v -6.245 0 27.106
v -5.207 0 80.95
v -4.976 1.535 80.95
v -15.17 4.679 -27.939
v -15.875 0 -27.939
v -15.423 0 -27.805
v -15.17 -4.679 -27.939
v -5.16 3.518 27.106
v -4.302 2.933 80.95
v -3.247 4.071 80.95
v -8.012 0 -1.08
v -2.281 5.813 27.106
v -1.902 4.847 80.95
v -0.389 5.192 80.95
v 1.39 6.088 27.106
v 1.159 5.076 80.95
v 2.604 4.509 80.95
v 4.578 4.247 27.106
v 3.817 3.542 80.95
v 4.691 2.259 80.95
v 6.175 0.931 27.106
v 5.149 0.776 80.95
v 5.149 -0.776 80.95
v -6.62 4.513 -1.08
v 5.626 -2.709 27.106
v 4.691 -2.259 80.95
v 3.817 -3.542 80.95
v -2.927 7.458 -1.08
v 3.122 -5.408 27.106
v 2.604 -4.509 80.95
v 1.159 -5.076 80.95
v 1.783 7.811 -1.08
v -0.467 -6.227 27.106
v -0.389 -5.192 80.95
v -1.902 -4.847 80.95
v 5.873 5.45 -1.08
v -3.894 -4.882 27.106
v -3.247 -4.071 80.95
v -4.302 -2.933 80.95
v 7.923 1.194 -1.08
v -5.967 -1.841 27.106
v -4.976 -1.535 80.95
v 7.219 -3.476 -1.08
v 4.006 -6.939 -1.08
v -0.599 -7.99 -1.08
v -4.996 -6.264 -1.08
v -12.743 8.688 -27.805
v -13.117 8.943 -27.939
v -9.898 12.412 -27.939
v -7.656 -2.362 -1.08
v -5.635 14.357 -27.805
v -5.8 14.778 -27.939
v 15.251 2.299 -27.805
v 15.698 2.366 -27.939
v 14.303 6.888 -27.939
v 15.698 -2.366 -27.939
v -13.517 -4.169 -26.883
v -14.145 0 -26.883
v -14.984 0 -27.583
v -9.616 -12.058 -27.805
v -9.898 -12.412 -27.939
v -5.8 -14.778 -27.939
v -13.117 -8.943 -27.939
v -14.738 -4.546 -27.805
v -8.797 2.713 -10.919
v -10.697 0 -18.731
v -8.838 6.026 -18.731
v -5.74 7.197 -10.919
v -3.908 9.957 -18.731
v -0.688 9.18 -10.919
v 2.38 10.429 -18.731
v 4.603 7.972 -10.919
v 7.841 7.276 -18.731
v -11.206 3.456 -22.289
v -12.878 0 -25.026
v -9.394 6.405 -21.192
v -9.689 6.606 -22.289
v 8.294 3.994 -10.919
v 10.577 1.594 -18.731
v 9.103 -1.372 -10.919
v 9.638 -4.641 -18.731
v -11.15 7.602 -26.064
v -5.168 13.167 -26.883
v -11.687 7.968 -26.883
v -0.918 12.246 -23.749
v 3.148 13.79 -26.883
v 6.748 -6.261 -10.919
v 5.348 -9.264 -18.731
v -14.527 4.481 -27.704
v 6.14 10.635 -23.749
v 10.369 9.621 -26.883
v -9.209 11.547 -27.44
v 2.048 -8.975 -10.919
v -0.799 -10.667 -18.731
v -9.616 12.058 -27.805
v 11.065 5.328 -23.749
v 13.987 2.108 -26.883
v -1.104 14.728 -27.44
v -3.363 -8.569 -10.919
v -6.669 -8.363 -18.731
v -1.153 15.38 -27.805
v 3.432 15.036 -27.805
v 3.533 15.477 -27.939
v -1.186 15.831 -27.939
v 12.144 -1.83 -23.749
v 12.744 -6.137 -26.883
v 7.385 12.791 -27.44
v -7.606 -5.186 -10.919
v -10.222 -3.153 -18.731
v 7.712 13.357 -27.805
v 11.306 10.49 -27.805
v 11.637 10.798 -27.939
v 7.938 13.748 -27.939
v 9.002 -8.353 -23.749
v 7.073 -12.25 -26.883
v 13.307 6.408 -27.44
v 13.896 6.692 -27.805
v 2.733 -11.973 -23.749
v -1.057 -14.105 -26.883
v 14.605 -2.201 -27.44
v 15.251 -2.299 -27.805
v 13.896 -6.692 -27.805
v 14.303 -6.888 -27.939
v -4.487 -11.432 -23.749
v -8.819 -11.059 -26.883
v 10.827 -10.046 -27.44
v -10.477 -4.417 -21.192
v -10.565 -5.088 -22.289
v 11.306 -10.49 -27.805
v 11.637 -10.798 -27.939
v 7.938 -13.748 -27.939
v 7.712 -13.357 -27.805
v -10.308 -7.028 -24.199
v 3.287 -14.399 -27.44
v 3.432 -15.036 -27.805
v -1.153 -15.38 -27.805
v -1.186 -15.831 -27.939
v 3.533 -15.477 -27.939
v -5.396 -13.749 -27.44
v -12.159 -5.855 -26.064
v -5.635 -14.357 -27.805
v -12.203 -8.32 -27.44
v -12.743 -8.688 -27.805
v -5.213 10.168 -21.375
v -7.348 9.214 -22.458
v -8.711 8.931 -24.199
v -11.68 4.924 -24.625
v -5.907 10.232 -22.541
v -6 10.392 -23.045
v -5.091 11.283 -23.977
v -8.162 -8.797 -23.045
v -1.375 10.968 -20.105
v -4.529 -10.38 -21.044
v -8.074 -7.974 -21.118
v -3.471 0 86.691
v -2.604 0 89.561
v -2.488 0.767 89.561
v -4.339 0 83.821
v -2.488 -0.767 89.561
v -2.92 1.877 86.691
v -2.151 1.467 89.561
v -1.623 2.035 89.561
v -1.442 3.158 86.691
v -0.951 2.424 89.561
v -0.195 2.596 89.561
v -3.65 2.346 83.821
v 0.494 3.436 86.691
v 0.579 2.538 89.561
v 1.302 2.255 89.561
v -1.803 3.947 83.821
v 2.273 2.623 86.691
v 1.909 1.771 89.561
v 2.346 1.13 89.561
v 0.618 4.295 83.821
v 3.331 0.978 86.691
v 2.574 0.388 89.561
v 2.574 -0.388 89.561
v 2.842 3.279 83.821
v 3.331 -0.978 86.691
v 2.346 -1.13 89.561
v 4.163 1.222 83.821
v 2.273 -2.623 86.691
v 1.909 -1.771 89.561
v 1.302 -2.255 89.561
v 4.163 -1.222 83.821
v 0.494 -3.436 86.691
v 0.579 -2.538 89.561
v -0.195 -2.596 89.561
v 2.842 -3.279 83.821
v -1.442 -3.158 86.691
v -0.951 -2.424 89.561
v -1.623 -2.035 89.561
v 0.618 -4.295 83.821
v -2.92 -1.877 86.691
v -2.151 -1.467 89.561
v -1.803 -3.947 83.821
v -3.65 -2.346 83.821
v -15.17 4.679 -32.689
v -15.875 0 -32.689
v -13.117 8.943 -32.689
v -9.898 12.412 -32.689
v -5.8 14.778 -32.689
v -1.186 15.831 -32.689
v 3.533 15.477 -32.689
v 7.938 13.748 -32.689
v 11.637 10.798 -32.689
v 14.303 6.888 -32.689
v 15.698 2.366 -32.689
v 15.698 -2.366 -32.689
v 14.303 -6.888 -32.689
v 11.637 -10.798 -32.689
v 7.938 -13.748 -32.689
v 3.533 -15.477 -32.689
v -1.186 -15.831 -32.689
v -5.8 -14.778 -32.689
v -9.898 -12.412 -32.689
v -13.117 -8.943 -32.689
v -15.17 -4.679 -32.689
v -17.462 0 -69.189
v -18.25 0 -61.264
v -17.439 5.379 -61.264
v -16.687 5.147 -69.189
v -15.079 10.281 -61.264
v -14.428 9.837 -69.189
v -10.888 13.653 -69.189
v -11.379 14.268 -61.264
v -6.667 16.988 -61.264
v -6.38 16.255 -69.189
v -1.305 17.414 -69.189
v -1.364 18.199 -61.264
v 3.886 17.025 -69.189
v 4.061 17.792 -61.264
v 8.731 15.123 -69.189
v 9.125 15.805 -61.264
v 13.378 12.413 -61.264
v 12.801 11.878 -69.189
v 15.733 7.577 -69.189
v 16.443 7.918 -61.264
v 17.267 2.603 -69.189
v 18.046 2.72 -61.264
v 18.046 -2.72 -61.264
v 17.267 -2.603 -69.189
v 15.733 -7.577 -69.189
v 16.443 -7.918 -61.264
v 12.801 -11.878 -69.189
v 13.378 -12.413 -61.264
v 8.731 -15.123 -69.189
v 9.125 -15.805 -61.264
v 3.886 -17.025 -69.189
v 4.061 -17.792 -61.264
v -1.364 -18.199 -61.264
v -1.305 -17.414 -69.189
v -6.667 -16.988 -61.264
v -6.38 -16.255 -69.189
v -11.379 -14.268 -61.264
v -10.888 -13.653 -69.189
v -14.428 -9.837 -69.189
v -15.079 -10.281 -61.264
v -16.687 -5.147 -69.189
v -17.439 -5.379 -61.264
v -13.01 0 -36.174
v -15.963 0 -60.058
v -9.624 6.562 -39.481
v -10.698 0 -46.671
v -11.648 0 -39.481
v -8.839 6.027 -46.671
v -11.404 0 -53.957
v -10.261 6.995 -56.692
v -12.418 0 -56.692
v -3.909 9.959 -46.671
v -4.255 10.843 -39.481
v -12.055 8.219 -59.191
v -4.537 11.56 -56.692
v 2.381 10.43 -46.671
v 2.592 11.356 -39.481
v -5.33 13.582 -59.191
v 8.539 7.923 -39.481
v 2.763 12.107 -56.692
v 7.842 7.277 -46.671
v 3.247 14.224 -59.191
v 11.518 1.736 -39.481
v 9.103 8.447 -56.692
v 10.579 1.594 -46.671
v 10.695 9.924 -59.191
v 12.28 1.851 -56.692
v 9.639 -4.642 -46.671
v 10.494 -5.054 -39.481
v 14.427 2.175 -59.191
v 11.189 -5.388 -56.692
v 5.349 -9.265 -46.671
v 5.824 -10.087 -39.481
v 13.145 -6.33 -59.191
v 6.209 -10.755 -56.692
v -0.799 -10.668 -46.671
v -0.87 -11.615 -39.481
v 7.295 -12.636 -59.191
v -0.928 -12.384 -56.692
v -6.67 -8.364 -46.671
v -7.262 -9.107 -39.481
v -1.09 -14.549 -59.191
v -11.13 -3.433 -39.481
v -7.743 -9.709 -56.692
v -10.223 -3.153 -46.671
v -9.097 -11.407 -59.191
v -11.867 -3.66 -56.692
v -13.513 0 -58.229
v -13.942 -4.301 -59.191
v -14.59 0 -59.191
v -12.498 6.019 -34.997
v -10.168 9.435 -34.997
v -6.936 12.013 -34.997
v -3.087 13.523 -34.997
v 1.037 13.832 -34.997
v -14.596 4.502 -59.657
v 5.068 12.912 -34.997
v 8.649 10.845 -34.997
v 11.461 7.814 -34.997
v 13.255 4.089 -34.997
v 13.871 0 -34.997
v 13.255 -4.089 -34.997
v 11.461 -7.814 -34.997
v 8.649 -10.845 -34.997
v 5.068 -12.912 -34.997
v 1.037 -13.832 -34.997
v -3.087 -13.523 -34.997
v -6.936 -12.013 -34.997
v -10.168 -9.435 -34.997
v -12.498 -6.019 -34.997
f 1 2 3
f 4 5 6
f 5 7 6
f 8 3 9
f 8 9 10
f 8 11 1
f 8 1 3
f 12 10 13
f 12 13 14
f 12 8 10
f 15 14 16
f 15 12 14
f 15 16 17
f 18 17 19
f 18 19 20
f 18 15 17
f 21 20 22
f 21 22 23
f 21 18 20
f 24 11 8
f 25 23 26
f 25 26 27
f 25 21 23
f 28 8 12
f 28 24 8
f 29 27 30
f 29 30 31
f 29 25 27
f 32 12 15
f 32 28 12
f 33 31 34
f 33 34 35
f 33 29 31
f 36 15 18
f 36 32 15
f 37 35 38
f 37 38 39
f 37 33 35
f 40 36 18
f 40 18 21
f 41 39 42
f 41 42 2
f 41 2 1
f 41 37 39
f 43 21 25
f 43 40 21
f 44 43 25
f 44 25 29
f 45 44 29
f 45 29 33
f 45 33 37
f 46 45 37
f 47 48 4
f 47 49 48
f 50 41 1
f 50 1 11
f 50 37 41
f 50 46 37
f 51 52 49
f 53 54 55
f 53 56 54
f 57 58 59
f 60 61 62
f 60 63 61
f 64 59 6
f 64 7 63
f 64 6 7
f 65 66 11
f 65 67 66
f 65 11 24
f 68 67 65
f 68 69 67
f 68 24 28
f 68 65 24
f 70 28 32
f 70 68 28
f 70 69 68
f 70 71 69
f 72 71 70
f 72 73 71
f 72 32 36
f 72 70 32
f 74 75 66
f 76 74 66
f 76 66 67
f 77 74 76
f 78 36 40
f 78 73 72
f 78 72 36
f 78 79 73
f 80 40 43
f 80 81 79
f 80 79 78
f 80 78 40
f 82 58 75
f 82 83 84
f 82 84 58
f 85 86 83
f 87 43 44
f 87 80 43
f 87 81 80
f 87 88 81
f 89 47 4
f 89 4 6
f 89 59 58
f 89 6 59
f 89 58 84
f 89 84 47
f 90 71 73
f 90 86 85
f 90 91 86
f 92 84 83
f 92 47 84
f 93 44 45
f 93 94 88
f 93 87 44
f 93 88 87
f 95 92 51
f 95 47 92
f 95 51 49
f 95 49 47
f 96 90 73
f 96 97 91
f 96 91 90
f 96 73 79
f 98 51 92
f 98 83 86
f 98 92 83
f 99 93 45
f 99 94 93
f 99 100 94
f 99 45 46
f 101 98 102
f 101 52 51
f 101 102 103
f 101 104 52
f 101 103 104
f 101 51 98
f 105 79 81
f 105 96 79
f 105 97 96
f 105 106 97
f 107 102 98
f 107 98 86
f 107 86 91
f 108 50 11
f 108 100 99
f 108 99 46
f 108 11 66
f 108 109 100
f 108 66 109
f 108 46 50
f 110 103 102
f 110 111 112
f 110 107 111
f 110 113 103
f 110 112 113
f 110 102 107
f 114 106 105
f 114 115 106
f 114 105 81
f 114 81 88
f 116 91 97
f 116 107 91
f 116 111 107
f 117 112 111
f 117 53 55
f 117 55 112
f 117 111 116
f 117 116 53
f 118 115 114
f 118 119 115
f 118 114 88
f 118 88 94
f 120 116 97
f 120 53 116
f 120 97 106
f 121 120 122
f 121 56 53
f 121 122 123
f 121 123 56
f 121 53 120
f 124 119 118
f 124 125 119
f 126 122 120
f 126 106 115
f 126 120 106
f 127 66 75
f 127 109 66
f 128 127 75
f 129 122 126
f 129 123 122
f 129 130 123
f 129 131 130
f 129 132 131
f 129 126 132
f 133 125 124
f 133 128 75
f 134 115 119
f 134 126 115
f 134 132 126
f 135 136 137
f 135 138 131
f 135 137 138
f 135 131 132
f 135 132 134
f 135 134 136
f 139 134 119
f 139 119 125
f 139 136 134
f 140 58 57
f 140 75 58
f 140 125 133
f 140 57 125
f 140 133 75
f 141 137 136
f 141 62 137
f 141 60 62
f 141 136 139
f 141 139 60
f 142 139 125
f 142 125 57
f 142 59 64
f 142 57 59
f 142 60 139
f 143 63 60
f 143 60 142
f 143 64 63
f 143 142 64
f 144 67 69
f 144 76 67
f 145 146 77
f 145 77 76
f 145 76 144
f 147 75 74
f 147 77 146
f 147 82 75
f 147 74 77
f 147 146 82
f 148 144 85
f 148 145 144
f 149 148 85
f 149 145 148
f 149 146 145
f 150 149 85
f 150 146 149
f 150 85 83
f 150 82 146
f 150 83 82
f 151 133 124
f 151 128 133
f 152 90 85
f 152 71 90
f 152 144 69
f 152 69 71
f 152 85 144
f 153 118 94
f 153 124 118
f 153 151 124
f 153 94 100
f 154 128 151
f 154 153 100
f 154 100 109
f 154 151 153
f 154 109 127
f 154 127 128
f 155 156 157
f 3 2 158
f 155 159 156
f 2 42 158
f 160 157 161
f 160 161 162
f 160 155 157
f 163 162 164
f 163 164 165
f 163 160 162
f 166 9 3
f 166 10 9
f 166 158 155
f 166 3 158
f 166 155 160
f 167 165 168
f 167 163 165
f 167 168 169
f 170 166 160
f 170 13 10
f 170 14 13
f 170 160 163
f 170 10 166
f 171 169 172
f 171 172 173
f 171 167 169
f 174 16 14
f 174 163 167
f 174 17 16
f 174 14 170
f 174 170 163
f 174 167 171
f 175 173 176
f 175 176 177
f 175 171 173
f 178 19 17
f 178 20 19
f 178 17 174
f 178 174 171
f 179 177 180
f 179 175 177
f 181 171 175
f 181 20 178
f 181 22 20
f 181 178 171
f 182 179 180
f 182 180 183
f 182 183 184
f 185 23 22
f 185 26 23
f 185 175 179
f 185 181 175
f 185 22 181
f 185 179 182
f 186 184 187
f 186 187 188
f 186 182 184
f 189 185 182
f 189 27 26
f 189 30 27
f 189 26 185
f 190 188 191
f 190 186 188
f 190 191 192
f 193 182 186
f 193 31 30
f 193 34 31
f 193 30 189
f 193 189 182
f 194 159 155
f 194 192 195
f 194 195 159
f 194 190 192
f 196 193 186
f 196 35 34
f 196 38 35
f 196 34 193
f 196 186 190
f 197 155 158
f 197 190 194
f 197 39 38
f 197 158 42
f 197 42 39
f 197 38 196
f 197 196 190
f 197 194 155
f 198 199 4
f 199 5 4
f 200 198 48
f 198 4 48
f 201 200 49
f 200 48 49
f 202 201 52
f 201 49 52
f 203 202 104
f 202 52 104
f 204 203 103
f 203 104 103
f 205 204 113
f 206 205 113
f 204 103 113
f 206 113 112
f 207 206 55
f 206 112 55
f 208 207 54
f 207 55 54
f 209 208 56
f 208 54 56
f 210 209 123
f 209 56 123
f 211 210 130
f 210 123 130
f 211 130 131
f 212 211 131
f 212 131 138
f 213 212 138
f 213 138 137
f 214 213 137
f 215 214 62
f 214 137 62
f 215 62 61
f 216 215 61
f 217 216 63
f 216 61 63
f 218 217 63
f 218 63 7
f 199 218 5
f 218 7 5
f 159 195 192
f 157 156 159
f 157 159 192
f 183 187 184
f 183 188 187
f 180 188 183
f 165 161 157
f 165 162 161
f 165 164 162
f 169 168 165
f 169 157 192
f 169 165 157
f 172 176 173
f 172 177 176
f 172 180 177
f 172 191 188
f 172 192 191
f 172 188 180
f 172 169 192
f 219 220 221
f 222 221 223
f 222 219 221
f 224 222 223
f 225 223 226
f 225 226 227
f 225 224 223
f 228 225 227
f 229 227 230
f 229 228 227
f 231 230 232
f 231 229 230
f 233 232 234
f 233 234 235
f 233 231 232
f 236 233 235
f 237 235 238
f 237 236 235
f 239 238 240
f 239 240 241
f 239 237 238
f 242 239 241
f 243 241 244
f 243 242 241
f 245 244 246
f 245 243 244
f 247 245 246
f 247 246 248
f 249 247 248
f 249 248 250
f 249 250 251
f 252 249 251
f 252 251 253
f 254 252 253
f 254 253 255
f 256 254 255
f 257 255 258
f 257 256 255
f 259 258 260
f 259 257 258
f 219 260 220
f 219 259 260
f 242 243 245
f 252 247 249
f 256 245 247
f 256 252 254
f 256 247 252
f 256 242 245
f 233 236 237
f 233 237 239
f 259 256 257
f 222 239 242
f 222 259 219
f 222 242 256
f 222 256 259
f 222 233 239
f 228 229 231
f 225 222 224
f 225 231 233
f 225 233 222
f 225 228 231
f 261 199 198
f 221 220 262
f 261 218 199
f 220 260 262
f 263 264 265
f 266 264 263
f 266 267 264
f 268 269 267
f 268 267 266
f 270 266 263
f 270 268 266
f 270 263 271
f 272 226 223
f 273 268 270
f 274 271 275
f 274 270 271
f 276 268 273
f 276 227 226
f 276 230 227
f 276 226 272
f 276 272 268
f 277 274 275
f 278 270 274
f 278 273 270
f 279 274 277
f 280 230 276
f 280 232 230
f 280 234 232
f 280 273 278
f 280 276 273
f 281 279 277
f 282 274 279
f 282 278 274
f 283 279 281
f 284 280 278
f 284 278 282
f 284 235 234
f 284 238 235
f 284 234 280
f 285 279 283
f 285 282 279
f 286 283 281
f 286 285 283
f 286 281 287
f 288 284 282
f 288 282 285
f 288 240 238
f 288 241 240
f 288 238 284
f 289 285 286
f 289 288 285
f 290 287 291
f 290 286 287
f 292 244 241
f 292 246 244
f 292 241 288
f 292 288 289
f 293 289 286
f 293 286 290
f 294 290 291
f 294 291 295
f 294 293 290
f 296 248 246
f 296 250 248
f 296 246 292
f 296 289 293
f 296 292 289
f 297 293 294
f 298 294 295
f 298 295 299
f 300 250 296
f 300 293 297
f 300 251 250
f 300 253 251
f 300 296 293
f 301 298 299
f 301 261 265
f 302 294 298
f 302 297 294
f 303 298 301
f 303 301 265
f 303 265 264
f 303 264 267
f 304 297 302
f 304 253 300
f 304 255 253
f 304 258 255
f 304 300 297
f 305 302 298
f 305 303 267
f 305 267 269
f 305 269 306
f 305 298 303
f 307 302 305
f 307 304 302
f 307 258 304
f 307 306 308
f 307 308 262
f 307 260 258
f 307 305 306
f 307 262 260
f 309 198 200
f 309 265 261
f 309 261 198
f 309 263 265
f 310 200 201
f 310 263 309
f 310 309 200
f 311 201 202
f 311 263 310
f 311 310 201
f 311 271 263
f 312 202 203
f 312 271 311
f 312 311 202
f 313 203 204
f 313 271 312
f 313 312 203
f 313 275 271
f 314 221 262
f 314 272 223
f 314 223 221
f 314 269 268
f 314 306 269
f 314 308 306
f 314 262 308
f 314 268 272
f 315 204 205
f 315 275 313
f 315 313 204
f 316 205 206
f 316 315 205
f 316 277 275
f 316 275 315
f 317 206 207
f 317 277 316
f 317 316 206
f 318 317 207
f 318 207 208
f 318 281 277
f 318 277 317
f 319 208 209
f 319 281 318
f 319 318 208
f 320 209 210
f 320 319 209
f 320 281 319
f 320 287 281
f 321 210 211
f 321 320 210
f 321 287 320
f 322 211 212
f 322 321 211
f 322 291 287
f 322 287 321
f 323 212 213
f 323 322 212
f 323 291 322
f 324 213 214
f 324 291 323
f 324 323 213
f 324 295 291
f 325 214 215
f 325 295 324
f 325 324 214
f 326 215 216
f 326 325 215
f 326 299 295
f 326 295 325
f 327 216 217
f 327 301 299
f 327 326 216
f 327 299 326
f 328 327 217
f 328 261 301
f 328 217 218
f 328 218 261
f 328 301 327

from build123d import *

# Parameters (mm, degrees)
F0_W = 15.875
F0_H = 4.7498


with BuildPart() as f1:
    # F0 (on Front) → F1 (revolve)
    with BuildSketch(Plane.XZ):
        with Locations((-7.9375, -30.3143975992)):
            Rectangle(F0_W, F0_H)
        with BuildLine():
            Line((-18.2499, -61.2642975992), (0, -61.2642975992))
            Line((0, -61.2642975992), (0, -32.6892975992))
            Line((0, -32.6892975992), (-15.875, -32.6892975992))
            add(Edge.make_bspline(
                [(-15.875, -32.6892975992), (-15.2979500412, -33.807611658), (-10.4821920255, -36.3577085762), (-9.7072227265, -58.4415786457), (-16.6218308083, -60.254956053), (-18.2499, -61.2642975992)],
                knots=[0, 0, 0, 0, 0.2505438775, 0.7149239973, 1, 1, 1, 1], degree=3))
        make_face()
        with BuildLine():
            Line((-15.875, -27.9394975992), (0, -27.9394975992))
            Line((0, -27.9394975992), (0, 89.5609024008))
            Line((0, 89.5609024008), (-2.6035, 89.5609024008))
            Line((-2.6035, 89.5609024008), (-5.207, 80.9503024008))
            add(Edge.make_bspline(
                [(-5.207, 80.9503024008), (-5.640507995, 22.4602864435), (-7.2317328357, -26.2209816068), (-15.875, -27.9394975992)],
                knots=[0, 0, 0, 0, 0.5514143677, 0.5514143677, 0.5514143677, 0.5514143677], degree=3))
        make_face()
        Polygon((-17.4625, -69.1890975992), (0, -69.1890975992), (0, -61.2642975992), (-18.2499, -61.2642975992), align=None)
    revolve(axis=Axis((0, 0, 10.1859024008), (0, 0, -1)))


solid = f1.part
